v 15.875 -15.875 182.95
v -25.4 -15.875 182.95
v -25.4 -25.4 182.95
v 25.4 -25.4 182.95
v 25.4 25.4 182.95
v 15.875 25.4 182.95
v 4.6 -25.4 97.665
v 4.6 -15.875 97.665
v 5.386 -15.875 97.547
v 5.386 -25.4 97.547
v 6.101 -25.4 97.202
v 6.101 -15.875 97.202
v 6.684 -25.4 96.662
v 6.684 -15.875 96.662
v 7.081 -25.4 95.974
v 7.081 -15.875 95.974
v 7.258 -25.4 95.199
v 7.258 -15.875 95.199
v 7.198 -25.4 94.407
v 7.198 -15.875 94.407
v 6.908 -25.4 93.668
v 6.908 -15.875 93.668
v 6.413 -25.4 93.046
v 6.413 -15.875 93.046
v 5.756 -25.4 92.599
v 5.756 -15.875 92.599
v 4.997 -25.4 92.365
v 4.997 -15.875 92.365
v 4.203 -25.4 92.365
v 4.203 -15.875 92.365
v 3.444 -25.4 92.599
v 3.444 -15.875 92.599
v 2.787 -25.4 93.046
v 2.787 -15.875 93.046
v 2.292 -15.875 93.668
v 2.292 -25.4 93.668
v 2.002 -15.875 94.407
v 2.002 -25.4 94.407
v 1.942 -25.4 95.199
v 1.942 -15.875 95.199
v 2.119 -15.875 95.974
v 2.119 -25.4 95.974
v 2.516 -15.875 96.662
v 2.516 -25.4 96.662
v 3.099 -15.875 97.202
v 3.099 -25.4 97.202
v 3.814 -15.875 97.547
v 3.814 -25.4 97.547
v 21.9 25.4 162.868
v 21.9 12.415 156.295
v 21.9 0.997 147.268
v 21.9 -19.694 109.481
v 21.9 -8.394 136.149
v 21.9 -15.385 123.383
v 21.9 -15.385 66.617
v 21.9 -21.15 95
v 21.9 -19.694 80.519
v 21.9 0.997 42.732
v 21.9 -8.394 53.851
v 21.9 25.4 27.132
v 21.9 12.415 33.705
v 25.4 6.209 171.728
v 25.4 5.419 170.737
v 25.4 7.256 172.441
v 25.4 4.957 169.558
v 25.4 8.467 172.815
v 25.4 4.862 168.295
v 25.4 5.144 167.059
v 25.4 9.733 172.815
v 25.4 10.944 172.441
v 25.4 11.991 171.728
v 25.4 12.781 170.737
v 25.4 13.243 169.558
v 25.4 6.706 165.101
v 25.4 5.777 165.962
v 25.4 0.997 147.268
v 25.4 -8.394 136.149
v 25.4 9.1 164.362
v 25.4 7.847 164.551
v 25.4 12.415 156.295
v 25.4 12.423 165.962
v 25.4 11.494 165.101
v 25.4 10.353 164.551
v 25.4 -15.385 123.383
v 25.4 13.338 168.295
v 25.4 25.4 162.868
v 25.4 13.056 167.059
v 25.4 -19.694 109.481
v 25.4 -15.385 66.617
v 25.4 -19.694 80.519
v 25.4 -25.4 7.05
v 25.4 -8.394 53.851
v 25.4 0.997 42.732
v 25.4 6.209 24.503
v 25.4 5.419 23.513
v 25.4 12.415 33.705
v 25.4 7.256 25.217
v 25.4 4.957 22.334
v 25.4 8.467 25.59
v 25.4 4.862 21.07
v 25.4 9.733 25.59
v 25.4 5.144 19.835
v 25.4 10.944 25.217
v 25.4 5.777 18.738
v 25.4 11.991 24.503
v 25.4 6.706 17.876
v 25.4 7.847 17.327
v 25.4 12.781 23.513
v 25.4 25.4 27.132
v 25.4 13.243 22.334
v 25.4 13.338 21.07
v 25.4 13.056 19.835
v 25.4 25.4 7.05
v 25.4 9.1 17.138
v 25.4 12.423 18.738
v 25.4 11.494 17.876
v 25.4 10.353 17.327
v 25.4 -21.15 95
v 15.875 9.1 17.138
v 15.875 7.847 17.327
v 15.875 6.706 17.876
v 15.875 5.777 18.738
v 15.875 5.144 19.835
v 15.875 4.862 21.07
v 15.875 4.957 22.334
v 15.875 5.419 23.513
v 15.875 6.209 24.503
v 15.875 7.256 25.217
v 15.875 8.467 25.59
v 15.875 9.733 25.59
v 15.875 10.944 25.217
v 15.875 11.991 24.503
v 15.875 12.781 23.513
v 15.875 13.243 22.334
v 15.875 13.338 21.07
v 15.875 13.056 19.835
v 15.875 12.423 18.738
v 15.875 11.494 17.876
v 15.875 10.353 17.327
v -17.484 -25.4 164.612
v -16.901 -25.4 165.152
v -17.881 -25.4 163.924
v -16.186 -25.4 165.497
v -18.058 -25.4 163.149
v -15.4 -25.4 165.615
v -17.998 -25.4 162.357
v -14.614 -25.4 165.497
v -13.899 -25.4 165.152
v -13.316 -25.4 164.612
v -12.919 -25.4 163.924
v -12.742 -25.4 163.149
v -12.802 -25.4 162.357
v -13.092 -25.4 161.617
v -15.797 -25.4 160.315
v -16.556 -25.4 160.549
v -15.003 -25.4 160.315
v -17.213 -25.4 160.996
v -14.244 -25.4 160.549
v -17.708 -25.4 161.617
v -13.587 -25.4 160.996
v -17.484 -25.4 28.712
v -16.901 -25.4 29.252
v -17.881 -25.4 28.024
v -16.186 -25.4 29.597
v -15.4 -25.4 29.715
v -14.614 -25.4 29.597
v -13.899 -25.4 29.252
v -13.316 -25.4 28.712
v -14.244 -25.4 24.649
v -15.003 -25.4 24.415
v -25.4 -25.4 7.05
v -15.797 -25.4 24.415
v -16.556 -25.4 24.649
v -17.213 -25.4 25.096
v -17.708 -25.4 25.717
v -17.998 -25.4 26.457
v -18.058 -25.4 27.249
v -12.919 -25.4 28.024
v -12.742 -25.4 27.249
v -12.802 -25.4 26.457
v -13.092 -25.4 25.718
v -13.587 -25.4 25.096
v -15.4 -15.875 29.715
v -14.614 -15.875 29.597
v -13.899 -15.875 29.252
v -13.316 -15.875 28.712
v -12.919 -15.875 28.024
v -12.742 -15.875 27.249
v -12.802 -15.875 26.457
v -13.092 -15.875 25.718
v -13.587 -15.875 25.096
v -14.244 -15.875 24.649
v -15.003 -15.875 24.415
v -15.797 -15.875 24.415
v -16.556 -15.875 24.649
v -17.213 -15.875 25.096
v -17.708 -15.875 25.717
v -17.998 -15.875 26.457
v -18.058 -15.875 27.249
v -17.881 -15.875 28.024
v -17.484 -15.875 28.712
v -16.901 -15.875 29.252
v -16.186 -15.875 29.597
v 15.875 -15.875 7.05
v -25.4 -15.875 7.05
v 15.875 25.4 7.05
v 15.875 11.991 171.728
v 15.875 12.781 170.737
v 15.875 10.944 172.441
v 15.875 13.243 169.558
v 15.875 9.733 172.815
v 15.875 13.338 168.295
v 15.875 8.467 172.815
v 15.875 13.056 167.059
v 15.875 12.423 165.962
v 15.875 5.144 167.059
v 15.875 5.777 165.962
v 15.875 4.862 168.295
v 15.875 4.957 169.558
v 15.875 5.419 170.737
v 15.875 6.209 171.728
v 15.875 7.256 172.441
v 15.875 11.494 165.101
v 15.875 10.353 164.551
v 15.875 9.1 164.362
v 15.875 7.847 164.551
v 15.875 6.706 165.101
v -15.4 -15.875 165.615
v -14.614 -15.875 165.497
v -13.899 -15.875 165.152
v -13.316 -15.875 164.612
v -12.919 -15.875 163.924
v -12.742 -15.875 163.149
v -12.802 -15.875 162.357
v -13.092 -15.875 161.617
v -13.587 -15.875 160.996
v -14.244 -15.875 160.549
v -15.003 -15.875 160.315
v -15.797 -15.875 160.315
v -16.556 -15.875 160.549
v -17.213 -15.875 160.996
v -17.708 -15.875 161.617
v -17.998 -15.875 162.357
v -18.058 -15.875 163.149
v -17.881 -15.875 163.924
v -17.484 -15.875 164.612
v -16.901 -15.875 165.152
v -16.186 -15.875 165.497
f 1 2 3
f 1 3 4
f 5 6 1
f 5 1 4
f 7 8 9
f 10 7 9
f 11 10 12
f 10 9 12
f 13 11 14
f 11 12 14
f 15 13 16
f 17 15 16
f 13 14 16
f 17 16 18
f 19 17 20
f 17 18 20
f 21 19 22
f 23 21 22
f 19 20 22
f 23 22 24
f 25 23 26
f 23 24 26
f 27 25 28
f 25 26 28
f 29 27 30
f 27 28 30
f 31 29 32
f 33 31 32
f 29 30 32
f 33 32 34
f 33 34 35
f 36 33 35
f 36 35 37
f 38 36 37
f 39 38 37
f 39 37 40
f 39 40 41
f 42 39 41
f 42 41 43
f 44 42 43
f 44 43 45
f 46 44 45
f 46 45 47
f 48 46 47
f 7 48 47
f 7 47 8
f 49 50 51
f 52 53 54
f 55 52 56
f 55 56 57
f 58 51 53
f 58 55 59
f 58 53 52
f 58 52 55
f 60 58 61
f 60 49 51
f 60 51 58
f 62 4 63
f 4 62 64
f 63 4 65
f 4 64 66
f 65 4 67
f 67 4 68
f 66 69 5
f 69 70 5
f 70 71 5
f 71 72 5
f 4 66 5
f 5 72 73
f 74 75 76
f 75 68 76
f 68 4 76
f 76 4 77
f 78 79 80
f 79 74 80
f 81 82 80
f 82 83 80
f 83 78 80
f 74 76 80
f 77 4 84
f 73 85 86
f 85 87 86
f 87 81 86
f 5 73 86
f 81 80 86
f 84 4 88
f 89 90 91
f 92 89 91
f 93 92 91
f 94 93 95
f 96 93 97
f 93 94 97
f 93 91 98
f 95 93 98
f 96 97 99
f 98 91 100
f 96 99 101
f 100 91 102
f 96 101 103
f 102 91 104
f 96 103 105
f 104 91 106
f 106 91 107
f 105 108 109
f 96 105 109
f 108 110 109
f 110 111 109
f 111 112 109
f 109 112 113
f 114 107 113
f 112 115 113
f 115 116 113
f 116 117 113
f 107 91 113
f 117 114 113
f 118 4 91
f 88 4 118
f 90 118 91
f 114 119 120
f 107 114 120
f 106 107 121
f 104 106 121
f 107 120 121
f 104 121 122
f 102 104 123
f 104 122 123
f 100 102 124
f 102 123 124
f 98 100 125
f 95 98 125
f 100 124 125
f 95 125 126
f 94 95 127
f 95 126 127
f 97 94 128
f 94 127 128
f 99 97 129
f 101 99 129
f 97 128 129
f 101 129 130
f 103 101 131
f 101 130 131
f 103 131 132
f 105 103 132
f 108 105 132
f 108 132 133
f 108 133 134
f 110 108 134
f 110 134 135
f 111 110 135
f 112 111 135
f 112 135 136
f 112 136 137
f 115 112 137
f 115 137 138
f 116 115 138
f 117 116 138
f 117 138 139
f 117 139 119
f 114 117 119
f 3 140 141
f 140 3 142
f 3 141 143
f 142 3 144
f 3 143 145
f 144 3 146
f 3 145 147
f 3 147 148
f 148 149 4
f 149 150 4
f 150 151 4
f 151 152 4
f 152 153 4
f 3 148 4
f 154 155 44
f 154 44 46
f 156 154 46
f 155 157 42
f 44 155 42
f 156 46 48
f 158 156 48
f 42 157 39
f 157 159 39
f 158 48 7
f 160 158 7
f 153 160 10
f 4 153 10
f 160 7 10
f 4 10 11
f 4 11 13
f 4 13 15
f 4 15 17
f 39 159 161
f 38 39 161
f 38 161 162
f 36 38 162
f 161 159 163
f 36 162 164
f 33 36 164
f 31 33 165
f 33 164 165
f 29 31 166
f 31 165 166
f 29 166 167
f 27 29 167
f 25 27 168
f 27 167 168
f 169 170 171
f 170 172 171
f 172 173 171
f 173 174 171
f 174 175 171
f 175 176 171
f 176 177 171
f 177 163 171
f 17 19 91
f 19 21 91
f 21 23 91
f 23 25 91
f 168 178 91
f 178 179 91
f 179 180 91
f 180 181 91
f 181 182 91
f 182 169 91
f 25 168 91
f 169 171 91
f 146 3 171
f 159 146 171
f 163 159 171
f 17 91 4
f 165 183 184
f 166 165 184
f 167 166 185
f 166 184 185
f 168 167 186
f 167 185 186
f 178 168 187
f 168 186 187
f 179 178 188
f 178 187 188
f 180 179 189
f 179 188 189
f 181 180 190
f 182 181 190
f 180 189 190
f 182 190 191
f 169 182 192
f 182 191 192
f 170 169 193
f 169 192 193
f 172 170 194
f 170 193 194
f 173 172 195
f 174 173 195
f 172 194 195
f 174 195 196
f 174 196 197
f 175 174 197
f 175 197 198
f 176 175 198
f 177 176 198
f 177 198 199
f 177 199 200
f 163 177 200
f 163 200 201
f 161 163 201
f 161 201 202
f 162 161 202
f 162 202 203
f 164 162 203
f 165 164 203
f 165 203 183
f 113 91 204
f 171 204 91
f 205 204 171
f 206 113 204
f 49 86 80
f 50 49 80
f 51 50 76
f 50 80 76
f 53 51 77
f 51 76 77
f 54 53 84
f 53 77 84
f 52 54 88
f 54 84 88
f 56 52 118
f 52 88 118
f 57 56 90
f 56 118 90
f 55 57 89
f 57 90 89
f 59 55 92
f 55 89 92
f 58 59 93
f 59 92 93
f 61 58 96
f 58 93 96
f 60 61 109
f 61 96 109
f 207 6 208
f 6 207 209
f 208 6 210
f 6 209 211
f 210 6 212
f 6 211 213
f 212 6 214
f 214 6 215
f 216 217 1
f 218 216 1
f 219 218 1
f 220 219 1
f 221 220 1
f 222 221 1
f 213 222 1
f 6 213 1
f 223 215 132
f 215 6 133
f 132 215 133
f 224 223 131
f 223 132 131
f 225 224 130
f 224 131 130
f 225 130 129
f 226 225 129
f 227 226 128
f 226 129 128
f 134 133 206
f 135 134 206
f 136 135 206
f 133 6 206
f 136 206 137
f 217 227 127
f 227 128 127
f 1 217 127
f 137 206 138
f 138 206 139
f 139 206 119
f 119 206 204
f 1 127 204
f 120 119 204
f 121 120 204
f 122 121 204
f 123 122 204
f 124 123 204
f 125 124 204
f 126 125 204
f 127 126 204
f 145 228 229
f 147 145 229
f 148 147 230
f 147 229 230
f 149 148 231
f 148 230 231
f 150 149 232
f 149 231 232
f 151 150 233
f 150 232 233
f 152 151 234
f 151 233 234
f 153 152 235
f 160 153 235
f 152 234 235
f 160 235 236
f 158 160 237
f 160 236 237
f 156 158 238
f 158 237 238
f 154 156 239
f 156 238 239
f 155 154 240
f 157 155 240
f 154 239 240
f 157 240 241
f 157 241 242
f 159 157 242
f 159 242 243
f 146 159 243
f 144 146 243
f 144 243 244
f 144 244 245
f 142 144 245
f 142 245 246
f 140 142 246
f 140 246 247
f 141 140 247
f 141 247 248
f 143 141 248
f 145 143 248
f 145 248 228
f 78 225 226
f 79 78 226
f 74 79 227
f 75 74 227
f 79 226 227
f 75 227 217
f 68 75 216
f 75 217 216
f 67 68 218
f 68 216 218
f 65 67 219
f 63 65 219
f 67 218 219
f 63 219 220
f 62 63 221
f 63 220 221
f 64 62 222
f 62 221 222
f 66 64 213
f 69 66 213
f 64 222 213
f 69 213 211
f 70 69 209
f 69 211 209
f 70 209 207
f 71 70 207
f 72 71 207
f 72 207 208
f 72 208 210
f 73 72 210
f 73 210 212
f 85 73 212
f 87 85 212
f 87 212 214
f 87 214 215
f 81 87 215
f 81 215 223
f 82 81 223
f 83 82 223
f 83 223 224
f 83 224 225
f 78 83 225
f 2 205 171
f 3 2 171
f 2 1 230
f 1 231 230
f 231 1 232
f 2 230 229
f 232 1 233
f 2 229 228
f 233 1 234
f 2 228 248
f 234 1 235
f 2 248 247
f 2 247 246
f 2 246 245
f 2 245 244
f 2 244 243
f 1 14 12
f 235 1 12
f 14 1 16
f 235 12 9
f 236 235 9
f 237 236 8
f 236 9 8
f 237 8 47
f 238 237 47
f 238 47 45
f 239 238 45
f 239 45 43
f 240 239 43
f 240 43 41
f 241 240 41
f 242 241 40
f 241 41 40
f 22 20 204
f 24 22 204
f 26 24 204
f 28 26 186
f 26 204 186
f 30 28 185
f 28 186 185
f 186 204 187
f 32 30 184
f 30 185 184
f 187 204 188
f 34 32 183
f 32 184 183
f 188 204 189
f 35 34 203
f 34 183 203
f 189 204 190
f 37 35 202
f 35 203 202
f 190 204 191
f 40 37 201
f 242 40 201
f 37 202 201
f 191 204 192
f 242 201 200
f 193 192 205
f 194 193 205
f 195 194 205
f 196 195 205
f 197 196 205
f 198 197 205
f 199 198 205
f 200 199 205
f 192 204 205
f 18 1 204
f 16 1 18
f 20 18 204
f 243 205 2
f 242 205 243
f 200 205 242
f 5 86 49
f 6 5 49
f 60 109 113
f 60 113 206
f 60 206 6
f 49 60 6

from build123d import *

# Parameters (mm, degrees)
BOSS_EXTRUDE1_DEPTH          = 190
SKETCH3_R                    = 72.75
CUT_EXTRUDE3_DEPTH           = 3.5
CUT_EXTRUDE4_DEPTH           = 7.05
CUT_EXTRUDE5_DEPTH           = 7.05
TAP_DRILL_FOR_M10X1_5_TAP1_D = 8.5
CUT_EXTRUDE6_REACH           = 191.26
SKETCH8_R                    = 2.665


with BuildPart() as part:
    # Sketch1 → Boss-Extrude1 (new body)
    with BuildSketch(Plane.XY):
        Polygon((-25.4, -25.4), (25.4, -25.4), (25.4, 25.4), (15.875, 25.4), (15.875, -15.875), (-25.4, -15.875), align=None)
    extrude(amount=BOSS_EXTRUDE1_DEPTH)

    # Sketch3 → Cut-Extrude3 (cut)
    with BuildSketch(Plane(origin=(25.4, 0, 0), x_dir=(0, 0, -1), z_dir=(1, 0, 0))):
        with Locations((-95, 51.6)):
            Circle(SKETCH3_R)
    extrude(amount=-CUT_EXTRUDE3_DEPTH, mode=Mode.SUBTRACT)

    # Sketch4 → Cut-Extrude4 (cut)
    with BuildSketch(Plane.XY.offset(190)):
        Polygon((25.4, -25.4), (25.4, 25.4), (15.875, 25.4), (15.875, -15.875), (-25.4, -15.875), (-25.4, -25.4), align=None)
    extrude(amount=-CUT_EXTRUDE4_DEPTH, mode=Mode.SUBTRACT)

    # Sketch5 → Cut-Extrude5 (cut)
    with BuildSketch(Plane(origin=(0, 0, 0), x_dir=(-1, 0, 0), z_dir=(0, 0, -1))):
        Polygon((-25.4, 25.4), (-25.4, -25.4), (25.4, -25.4), (25.4, -15.875), (-15.875, -15.875), (-15.875, 25.4), align=None)
    extrude(amount=-CUT_EXTRUDE5_DEPTH, mode=Mode.SUBTRACT)

    # Tap Drill for M10x1.5 Tap1 (through all)
    with Locations(Plane(origin=(25.4, 9.1, 168.612159322), x_dir=(0, 0, 1), z_dir=(1, 0, 0))):
        with Locations((0, 0), (-147.224318644, 0)):
            Hole(TAP_DRILL_FOR_M10X1_5_TAP1_D / 2)

    # Sketch8 → Cut-Extrude6 (cut, up to next)
    with BuildSketch(Plane(origin=(0, -15.875, 0), x_dir=(1, 0, 0), z_dir=(0, 1, 0)), mode=Mode.PRIVATE) as cut_extrude6_sk1:
        with Locations(Location((-15.4, -27.05, 0), (0, 0, 270))):
            Circle(SKETCH8_R)
    cut_extrude6_tool1 = extrude(cut_extrude6_sk1.sketch, amount=-CUT_EXTRUDE6_REACH, mode=Mode.PRIVATE) & part.part
    # Sketch8 → Cut-Extrude6 (cut, up to next)
    with BuildSketch(Plane(origin=(0, -15.875, 0), x_dir=(1, 0, 0), z_dir=(0, 1, 0)), mode=Mode.PRIVATE) as cut_extrude6_sk2:
        with Locations(Location((4.6, -95, 0), (0, 0, 270))):
            Circle(SKETCH8_R)
    cut_extrude6_tool2 = extrude(cut_extrude6_sk2.sketch, amount=-CUT_EXTRUDE6_REACH, mode=Mode.PRIVATE) & part.part
    # Sketch8 → Cut-Extrude6 (cut, up to next)
    with BuildSketch(Plane(origin=(0, -15.875, 0), x_dir=(1, 0, 0), z_dir=(0, 1, 0)), mode=Mode.PRIVATE) as cut_extrude6_sk3:
        with Locations(Location((-15.4, -162.95, 0), (0, 0, 270))):
            Circle(SKETCH8_R)
    cut_extrude6_tool3 = extrude(cut_extrude6_sk3.sketch, amount=-CUT_EXTRUDE6_REACH, mode=Mode.PRIVATE) & part.part
    add(cut_extrude6_tool1.solids().sort_by_distance((-15.4, -15.875, 27.05))[0], mode=Mode.SUBTRACT)
    add(cut_extrude6_tool2.solids().sort_by_distance((4.6, -15.875, 95))[0], mode=Mode.SUBTRACT)
    add(cut_extrude6_tool3.solids().sort_by_distance((-15.4, -15.875, 162.95))[0], mode=Mode.SUBTRACT)


solid = part.part
